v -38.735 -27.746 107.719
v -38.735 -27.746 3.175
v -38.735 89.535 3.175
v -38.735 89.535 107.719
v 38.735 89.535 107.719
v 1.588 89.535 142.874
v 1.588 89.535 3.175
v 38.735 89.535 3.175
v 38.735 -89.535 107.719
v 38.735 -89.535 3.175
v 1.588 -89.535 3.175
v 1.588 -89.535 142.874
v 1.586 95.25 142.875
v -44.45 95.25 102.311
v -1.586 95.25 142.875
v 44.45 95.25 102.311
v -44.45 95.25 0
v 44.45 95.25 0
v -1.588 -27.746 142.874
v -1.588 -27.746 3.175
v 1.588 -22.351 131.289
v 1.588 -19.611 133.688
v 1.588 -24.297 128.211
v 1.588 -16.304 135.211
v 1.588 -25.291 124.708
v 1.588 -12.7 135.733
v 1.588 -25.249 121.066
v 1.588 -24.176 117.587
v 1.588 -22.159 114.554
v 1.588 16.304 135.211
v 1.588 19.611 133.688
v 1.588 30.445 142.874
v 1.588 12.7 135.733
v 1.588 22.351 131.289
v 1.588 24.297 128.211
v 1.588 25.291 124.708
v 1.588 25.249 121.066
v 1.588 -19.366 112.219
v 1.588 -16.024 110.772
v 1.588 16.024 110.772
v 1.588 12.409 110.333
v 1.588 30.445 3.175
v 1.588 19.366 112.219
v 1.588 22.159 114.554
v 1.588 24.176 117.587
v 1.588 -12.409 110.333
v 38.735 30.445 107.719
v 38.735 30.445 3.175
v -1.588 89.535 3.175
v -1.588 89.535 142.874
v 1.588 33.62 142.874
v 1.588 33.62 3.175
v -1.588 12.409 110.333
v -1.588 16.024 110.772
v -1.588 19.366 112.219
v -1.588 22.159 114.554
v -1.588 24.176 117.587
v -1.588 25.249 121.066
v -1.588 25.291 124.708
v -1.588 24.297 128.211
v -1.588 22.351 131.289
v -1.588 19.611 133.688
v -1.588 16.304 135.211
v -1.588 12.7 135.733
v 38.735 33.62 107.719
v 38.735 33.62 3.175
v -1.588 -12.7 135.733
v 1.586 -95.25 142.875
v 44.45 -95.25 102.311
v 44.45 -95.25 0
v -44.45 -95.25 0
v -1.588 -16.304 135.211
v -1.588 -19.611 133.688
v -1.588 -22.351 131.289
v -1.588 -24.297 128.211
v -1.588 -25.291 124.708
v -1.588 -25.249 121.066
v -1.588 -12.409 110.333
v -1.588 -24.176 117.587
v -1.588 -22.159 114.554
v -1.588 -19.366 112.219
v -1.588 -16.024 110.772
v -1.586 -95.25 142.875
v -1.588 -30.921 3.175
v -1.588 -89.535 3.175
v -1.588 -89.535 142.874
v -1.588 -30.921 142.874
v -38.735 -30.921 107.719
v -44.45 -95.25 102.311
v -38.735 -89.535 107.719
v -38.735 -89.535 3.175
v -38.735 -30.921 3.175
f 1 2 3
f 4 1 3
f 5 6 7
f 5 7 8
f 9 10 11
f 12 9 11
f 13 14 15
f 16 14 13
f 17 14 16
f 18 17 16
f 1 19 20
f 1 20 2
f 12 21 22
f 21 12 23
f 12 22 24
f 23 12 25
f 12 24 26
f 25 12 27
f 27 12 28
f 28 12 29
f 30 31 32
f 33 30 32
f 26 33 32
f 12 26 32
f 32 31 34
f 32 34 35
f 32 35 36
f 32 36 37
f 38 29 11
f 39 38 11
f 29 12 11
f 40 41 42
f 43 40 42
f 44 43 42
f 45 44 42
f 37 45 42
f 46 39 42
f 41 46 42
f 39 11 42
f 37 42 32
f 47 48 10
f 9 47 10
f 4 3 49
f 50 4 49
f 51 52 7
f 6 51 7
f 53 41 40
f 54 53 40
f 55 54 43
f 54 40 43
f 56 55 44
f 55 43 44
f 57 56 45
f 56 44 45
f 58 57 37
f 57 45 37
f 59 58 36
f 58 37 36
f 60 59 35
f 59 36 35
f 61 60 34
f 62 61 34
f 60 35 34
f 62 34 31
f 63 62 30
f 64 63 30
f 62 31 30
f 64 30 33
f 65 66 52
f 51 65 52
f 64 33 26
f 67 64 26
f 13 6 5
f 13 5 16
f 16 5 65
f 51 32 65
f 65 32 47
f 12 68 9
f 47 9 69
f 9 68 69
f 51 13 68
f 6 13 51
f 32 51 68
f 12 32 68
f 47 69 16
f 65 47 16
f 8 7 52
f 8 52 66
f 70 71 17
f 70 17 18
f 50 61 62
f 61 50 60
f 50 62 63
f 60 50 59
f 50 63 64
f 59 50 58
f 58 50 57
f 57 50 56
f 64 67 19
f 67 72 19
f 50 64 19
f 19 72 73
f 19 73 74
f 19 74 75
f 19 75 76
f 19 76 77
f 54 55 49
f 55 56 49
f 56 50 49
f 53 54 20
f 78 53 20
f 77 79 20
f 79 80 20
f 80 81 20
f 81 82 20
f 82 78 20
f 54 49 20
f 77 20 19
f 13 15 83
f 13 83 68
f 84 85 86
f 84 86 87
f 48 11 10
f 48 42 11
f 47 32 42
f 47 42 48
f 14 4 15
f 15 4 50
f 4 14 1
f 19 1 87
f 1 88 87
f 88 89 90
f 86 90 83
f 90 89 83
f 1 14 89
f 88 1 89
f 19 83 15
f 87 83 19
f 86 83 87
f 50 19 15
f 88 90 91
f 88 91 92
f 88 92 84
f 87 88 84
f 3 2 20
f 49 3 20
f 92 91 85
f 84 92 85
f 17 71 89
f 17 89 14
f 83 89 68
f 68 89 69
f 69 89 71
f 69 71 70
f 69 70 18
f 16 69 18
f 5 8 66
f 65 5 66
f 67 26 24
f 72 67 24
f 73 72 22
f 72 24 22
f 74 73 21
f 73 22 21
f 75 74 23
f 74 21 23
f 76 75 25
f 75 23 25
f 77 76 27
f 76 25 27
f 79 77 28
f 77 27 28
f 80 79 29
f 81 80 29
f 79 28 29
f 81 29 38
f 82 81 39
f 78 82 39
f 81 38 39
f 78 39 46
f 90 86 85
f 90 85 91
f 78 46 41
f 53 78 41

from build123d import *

# Parameters (mm, degrees)
F0_W     = 88.9
F0_H     = 190.5
F0_W_2   = 82.55
F0_H_2   = 184.15
F1_DEPTH = 3.175
F2_W     = 88.9
F2_H     = 190.5
F2_W_2   = 3.175
F2_H_2   = 3.175
F2_W_3   = 37.1475
F2_H_3   = 58.1914
F2_H_4   = 55.9145467066
F2_H_5   = 58.6140532934
F3_DEPTH = 139.7
F6_DEPTH = 190.5
F8_DEPTH = 25.4


# Not quite as in the source:
# - a feature names something its author has since deleted; it is built from what else it names


with BuildPart() as f1:
    # F0 (on Top) → F1 (new body)
    with BuildSketch(Plane.XY):
        Rectangle(F0_W, F0_H)
        Rectangle(F0_W_2, F0_H_2, mode=Mode.SUBTRACT)
        Rectangle(F0_W_2, F0_H_2)
    extrude(amount=F1_DEPTH)

    # F2 (on face) → F3 (join)
    with BuildSketch(Plane.XY.offset(3.175)):
        Rectangle(F2_W, F2_H)
        Polygon((-1.5875, -89.535), (-38.735, -89.535), (-38.735, -30.9209467066), (-38.735, -27.7459467066), (-38.735, 89.535), (-1.5875, 89.535), (1.5875, 89.535), (38.735, 89.535), (38.735, 33.6204532934), (38.735, 30.4454532934), (38.735, -89.535), (1.5875, -89.535), align=None, mode=Mode.SUBTRACT)
        with Locations((0, 32.0329532934)):
            Rectangle(F2_W_2, F2_H_2)
        with Locations((20.16125, 32.0329532934)):
            Rectangle(F2_W_3, F2_H_2)
        with Locations((-20.16125, -29.3334467066)):
            Rectangle(F2_W_3, F2_H_2)
        with Locations((0, -29.3334467066)):
            Rectangle(F2_W_2, F2_H_2)
        with Locations((0, 1.3497532934)):
            Rectangle(F2_W_2, F2_H_3)
        with Locations((0, 61.5777266467)):
            Rectangle(F2_W_2, F2_H_4)
        with Locations((0, -60.2279733533)):
            Rectangle(F2_W_2, F2_H_5)
    extrude(amount=F3_DEPTH)

    # F5 (on face) → F6 (cut)
    with BuildSketch(Plane.XZ.offset(95.25)):
        Polygon((-44.45, 102.3109257221), (-1.5860880958, 142.875), (-44.45, 142.875), align=None)
        Polygon((44.45, 142.875), (1.5860880958, 142.875), (44.45, 102.3109257221), align=None)
    extrude(amount=-F6_DEPTH, mode=Mode.SUBTRACT)

    # F7 (on face) → F8 (cut)
    with BuildSketch(Plane.YZ.offset(1.5875)):
        with BuildLine():
            Line((12.7, 135.732749784), (0, 135.732749784))
            Line((0, 135.732749784), (-12.7, 135.732749784))
            ThreePointArc((-12.7, 135.732749784), (-25.4008333473, 122.8855821986), (-12.4090174213, 110.332749784))
            Line((-12.4090174213, 110.332749784), (0, 110.332749784))
            Line((0, 110.332749784), (12.4090174213, 110.332749784))
            ThreePointArc((12.4090174213, 110.332749784), (25.4008333473, 122.8855821986), (12.7, 135.732749784))
        make_face()
    extrude(amount=-F8_DEPTH, mode=Mode.SUBTRACT)


solid = f1.part
